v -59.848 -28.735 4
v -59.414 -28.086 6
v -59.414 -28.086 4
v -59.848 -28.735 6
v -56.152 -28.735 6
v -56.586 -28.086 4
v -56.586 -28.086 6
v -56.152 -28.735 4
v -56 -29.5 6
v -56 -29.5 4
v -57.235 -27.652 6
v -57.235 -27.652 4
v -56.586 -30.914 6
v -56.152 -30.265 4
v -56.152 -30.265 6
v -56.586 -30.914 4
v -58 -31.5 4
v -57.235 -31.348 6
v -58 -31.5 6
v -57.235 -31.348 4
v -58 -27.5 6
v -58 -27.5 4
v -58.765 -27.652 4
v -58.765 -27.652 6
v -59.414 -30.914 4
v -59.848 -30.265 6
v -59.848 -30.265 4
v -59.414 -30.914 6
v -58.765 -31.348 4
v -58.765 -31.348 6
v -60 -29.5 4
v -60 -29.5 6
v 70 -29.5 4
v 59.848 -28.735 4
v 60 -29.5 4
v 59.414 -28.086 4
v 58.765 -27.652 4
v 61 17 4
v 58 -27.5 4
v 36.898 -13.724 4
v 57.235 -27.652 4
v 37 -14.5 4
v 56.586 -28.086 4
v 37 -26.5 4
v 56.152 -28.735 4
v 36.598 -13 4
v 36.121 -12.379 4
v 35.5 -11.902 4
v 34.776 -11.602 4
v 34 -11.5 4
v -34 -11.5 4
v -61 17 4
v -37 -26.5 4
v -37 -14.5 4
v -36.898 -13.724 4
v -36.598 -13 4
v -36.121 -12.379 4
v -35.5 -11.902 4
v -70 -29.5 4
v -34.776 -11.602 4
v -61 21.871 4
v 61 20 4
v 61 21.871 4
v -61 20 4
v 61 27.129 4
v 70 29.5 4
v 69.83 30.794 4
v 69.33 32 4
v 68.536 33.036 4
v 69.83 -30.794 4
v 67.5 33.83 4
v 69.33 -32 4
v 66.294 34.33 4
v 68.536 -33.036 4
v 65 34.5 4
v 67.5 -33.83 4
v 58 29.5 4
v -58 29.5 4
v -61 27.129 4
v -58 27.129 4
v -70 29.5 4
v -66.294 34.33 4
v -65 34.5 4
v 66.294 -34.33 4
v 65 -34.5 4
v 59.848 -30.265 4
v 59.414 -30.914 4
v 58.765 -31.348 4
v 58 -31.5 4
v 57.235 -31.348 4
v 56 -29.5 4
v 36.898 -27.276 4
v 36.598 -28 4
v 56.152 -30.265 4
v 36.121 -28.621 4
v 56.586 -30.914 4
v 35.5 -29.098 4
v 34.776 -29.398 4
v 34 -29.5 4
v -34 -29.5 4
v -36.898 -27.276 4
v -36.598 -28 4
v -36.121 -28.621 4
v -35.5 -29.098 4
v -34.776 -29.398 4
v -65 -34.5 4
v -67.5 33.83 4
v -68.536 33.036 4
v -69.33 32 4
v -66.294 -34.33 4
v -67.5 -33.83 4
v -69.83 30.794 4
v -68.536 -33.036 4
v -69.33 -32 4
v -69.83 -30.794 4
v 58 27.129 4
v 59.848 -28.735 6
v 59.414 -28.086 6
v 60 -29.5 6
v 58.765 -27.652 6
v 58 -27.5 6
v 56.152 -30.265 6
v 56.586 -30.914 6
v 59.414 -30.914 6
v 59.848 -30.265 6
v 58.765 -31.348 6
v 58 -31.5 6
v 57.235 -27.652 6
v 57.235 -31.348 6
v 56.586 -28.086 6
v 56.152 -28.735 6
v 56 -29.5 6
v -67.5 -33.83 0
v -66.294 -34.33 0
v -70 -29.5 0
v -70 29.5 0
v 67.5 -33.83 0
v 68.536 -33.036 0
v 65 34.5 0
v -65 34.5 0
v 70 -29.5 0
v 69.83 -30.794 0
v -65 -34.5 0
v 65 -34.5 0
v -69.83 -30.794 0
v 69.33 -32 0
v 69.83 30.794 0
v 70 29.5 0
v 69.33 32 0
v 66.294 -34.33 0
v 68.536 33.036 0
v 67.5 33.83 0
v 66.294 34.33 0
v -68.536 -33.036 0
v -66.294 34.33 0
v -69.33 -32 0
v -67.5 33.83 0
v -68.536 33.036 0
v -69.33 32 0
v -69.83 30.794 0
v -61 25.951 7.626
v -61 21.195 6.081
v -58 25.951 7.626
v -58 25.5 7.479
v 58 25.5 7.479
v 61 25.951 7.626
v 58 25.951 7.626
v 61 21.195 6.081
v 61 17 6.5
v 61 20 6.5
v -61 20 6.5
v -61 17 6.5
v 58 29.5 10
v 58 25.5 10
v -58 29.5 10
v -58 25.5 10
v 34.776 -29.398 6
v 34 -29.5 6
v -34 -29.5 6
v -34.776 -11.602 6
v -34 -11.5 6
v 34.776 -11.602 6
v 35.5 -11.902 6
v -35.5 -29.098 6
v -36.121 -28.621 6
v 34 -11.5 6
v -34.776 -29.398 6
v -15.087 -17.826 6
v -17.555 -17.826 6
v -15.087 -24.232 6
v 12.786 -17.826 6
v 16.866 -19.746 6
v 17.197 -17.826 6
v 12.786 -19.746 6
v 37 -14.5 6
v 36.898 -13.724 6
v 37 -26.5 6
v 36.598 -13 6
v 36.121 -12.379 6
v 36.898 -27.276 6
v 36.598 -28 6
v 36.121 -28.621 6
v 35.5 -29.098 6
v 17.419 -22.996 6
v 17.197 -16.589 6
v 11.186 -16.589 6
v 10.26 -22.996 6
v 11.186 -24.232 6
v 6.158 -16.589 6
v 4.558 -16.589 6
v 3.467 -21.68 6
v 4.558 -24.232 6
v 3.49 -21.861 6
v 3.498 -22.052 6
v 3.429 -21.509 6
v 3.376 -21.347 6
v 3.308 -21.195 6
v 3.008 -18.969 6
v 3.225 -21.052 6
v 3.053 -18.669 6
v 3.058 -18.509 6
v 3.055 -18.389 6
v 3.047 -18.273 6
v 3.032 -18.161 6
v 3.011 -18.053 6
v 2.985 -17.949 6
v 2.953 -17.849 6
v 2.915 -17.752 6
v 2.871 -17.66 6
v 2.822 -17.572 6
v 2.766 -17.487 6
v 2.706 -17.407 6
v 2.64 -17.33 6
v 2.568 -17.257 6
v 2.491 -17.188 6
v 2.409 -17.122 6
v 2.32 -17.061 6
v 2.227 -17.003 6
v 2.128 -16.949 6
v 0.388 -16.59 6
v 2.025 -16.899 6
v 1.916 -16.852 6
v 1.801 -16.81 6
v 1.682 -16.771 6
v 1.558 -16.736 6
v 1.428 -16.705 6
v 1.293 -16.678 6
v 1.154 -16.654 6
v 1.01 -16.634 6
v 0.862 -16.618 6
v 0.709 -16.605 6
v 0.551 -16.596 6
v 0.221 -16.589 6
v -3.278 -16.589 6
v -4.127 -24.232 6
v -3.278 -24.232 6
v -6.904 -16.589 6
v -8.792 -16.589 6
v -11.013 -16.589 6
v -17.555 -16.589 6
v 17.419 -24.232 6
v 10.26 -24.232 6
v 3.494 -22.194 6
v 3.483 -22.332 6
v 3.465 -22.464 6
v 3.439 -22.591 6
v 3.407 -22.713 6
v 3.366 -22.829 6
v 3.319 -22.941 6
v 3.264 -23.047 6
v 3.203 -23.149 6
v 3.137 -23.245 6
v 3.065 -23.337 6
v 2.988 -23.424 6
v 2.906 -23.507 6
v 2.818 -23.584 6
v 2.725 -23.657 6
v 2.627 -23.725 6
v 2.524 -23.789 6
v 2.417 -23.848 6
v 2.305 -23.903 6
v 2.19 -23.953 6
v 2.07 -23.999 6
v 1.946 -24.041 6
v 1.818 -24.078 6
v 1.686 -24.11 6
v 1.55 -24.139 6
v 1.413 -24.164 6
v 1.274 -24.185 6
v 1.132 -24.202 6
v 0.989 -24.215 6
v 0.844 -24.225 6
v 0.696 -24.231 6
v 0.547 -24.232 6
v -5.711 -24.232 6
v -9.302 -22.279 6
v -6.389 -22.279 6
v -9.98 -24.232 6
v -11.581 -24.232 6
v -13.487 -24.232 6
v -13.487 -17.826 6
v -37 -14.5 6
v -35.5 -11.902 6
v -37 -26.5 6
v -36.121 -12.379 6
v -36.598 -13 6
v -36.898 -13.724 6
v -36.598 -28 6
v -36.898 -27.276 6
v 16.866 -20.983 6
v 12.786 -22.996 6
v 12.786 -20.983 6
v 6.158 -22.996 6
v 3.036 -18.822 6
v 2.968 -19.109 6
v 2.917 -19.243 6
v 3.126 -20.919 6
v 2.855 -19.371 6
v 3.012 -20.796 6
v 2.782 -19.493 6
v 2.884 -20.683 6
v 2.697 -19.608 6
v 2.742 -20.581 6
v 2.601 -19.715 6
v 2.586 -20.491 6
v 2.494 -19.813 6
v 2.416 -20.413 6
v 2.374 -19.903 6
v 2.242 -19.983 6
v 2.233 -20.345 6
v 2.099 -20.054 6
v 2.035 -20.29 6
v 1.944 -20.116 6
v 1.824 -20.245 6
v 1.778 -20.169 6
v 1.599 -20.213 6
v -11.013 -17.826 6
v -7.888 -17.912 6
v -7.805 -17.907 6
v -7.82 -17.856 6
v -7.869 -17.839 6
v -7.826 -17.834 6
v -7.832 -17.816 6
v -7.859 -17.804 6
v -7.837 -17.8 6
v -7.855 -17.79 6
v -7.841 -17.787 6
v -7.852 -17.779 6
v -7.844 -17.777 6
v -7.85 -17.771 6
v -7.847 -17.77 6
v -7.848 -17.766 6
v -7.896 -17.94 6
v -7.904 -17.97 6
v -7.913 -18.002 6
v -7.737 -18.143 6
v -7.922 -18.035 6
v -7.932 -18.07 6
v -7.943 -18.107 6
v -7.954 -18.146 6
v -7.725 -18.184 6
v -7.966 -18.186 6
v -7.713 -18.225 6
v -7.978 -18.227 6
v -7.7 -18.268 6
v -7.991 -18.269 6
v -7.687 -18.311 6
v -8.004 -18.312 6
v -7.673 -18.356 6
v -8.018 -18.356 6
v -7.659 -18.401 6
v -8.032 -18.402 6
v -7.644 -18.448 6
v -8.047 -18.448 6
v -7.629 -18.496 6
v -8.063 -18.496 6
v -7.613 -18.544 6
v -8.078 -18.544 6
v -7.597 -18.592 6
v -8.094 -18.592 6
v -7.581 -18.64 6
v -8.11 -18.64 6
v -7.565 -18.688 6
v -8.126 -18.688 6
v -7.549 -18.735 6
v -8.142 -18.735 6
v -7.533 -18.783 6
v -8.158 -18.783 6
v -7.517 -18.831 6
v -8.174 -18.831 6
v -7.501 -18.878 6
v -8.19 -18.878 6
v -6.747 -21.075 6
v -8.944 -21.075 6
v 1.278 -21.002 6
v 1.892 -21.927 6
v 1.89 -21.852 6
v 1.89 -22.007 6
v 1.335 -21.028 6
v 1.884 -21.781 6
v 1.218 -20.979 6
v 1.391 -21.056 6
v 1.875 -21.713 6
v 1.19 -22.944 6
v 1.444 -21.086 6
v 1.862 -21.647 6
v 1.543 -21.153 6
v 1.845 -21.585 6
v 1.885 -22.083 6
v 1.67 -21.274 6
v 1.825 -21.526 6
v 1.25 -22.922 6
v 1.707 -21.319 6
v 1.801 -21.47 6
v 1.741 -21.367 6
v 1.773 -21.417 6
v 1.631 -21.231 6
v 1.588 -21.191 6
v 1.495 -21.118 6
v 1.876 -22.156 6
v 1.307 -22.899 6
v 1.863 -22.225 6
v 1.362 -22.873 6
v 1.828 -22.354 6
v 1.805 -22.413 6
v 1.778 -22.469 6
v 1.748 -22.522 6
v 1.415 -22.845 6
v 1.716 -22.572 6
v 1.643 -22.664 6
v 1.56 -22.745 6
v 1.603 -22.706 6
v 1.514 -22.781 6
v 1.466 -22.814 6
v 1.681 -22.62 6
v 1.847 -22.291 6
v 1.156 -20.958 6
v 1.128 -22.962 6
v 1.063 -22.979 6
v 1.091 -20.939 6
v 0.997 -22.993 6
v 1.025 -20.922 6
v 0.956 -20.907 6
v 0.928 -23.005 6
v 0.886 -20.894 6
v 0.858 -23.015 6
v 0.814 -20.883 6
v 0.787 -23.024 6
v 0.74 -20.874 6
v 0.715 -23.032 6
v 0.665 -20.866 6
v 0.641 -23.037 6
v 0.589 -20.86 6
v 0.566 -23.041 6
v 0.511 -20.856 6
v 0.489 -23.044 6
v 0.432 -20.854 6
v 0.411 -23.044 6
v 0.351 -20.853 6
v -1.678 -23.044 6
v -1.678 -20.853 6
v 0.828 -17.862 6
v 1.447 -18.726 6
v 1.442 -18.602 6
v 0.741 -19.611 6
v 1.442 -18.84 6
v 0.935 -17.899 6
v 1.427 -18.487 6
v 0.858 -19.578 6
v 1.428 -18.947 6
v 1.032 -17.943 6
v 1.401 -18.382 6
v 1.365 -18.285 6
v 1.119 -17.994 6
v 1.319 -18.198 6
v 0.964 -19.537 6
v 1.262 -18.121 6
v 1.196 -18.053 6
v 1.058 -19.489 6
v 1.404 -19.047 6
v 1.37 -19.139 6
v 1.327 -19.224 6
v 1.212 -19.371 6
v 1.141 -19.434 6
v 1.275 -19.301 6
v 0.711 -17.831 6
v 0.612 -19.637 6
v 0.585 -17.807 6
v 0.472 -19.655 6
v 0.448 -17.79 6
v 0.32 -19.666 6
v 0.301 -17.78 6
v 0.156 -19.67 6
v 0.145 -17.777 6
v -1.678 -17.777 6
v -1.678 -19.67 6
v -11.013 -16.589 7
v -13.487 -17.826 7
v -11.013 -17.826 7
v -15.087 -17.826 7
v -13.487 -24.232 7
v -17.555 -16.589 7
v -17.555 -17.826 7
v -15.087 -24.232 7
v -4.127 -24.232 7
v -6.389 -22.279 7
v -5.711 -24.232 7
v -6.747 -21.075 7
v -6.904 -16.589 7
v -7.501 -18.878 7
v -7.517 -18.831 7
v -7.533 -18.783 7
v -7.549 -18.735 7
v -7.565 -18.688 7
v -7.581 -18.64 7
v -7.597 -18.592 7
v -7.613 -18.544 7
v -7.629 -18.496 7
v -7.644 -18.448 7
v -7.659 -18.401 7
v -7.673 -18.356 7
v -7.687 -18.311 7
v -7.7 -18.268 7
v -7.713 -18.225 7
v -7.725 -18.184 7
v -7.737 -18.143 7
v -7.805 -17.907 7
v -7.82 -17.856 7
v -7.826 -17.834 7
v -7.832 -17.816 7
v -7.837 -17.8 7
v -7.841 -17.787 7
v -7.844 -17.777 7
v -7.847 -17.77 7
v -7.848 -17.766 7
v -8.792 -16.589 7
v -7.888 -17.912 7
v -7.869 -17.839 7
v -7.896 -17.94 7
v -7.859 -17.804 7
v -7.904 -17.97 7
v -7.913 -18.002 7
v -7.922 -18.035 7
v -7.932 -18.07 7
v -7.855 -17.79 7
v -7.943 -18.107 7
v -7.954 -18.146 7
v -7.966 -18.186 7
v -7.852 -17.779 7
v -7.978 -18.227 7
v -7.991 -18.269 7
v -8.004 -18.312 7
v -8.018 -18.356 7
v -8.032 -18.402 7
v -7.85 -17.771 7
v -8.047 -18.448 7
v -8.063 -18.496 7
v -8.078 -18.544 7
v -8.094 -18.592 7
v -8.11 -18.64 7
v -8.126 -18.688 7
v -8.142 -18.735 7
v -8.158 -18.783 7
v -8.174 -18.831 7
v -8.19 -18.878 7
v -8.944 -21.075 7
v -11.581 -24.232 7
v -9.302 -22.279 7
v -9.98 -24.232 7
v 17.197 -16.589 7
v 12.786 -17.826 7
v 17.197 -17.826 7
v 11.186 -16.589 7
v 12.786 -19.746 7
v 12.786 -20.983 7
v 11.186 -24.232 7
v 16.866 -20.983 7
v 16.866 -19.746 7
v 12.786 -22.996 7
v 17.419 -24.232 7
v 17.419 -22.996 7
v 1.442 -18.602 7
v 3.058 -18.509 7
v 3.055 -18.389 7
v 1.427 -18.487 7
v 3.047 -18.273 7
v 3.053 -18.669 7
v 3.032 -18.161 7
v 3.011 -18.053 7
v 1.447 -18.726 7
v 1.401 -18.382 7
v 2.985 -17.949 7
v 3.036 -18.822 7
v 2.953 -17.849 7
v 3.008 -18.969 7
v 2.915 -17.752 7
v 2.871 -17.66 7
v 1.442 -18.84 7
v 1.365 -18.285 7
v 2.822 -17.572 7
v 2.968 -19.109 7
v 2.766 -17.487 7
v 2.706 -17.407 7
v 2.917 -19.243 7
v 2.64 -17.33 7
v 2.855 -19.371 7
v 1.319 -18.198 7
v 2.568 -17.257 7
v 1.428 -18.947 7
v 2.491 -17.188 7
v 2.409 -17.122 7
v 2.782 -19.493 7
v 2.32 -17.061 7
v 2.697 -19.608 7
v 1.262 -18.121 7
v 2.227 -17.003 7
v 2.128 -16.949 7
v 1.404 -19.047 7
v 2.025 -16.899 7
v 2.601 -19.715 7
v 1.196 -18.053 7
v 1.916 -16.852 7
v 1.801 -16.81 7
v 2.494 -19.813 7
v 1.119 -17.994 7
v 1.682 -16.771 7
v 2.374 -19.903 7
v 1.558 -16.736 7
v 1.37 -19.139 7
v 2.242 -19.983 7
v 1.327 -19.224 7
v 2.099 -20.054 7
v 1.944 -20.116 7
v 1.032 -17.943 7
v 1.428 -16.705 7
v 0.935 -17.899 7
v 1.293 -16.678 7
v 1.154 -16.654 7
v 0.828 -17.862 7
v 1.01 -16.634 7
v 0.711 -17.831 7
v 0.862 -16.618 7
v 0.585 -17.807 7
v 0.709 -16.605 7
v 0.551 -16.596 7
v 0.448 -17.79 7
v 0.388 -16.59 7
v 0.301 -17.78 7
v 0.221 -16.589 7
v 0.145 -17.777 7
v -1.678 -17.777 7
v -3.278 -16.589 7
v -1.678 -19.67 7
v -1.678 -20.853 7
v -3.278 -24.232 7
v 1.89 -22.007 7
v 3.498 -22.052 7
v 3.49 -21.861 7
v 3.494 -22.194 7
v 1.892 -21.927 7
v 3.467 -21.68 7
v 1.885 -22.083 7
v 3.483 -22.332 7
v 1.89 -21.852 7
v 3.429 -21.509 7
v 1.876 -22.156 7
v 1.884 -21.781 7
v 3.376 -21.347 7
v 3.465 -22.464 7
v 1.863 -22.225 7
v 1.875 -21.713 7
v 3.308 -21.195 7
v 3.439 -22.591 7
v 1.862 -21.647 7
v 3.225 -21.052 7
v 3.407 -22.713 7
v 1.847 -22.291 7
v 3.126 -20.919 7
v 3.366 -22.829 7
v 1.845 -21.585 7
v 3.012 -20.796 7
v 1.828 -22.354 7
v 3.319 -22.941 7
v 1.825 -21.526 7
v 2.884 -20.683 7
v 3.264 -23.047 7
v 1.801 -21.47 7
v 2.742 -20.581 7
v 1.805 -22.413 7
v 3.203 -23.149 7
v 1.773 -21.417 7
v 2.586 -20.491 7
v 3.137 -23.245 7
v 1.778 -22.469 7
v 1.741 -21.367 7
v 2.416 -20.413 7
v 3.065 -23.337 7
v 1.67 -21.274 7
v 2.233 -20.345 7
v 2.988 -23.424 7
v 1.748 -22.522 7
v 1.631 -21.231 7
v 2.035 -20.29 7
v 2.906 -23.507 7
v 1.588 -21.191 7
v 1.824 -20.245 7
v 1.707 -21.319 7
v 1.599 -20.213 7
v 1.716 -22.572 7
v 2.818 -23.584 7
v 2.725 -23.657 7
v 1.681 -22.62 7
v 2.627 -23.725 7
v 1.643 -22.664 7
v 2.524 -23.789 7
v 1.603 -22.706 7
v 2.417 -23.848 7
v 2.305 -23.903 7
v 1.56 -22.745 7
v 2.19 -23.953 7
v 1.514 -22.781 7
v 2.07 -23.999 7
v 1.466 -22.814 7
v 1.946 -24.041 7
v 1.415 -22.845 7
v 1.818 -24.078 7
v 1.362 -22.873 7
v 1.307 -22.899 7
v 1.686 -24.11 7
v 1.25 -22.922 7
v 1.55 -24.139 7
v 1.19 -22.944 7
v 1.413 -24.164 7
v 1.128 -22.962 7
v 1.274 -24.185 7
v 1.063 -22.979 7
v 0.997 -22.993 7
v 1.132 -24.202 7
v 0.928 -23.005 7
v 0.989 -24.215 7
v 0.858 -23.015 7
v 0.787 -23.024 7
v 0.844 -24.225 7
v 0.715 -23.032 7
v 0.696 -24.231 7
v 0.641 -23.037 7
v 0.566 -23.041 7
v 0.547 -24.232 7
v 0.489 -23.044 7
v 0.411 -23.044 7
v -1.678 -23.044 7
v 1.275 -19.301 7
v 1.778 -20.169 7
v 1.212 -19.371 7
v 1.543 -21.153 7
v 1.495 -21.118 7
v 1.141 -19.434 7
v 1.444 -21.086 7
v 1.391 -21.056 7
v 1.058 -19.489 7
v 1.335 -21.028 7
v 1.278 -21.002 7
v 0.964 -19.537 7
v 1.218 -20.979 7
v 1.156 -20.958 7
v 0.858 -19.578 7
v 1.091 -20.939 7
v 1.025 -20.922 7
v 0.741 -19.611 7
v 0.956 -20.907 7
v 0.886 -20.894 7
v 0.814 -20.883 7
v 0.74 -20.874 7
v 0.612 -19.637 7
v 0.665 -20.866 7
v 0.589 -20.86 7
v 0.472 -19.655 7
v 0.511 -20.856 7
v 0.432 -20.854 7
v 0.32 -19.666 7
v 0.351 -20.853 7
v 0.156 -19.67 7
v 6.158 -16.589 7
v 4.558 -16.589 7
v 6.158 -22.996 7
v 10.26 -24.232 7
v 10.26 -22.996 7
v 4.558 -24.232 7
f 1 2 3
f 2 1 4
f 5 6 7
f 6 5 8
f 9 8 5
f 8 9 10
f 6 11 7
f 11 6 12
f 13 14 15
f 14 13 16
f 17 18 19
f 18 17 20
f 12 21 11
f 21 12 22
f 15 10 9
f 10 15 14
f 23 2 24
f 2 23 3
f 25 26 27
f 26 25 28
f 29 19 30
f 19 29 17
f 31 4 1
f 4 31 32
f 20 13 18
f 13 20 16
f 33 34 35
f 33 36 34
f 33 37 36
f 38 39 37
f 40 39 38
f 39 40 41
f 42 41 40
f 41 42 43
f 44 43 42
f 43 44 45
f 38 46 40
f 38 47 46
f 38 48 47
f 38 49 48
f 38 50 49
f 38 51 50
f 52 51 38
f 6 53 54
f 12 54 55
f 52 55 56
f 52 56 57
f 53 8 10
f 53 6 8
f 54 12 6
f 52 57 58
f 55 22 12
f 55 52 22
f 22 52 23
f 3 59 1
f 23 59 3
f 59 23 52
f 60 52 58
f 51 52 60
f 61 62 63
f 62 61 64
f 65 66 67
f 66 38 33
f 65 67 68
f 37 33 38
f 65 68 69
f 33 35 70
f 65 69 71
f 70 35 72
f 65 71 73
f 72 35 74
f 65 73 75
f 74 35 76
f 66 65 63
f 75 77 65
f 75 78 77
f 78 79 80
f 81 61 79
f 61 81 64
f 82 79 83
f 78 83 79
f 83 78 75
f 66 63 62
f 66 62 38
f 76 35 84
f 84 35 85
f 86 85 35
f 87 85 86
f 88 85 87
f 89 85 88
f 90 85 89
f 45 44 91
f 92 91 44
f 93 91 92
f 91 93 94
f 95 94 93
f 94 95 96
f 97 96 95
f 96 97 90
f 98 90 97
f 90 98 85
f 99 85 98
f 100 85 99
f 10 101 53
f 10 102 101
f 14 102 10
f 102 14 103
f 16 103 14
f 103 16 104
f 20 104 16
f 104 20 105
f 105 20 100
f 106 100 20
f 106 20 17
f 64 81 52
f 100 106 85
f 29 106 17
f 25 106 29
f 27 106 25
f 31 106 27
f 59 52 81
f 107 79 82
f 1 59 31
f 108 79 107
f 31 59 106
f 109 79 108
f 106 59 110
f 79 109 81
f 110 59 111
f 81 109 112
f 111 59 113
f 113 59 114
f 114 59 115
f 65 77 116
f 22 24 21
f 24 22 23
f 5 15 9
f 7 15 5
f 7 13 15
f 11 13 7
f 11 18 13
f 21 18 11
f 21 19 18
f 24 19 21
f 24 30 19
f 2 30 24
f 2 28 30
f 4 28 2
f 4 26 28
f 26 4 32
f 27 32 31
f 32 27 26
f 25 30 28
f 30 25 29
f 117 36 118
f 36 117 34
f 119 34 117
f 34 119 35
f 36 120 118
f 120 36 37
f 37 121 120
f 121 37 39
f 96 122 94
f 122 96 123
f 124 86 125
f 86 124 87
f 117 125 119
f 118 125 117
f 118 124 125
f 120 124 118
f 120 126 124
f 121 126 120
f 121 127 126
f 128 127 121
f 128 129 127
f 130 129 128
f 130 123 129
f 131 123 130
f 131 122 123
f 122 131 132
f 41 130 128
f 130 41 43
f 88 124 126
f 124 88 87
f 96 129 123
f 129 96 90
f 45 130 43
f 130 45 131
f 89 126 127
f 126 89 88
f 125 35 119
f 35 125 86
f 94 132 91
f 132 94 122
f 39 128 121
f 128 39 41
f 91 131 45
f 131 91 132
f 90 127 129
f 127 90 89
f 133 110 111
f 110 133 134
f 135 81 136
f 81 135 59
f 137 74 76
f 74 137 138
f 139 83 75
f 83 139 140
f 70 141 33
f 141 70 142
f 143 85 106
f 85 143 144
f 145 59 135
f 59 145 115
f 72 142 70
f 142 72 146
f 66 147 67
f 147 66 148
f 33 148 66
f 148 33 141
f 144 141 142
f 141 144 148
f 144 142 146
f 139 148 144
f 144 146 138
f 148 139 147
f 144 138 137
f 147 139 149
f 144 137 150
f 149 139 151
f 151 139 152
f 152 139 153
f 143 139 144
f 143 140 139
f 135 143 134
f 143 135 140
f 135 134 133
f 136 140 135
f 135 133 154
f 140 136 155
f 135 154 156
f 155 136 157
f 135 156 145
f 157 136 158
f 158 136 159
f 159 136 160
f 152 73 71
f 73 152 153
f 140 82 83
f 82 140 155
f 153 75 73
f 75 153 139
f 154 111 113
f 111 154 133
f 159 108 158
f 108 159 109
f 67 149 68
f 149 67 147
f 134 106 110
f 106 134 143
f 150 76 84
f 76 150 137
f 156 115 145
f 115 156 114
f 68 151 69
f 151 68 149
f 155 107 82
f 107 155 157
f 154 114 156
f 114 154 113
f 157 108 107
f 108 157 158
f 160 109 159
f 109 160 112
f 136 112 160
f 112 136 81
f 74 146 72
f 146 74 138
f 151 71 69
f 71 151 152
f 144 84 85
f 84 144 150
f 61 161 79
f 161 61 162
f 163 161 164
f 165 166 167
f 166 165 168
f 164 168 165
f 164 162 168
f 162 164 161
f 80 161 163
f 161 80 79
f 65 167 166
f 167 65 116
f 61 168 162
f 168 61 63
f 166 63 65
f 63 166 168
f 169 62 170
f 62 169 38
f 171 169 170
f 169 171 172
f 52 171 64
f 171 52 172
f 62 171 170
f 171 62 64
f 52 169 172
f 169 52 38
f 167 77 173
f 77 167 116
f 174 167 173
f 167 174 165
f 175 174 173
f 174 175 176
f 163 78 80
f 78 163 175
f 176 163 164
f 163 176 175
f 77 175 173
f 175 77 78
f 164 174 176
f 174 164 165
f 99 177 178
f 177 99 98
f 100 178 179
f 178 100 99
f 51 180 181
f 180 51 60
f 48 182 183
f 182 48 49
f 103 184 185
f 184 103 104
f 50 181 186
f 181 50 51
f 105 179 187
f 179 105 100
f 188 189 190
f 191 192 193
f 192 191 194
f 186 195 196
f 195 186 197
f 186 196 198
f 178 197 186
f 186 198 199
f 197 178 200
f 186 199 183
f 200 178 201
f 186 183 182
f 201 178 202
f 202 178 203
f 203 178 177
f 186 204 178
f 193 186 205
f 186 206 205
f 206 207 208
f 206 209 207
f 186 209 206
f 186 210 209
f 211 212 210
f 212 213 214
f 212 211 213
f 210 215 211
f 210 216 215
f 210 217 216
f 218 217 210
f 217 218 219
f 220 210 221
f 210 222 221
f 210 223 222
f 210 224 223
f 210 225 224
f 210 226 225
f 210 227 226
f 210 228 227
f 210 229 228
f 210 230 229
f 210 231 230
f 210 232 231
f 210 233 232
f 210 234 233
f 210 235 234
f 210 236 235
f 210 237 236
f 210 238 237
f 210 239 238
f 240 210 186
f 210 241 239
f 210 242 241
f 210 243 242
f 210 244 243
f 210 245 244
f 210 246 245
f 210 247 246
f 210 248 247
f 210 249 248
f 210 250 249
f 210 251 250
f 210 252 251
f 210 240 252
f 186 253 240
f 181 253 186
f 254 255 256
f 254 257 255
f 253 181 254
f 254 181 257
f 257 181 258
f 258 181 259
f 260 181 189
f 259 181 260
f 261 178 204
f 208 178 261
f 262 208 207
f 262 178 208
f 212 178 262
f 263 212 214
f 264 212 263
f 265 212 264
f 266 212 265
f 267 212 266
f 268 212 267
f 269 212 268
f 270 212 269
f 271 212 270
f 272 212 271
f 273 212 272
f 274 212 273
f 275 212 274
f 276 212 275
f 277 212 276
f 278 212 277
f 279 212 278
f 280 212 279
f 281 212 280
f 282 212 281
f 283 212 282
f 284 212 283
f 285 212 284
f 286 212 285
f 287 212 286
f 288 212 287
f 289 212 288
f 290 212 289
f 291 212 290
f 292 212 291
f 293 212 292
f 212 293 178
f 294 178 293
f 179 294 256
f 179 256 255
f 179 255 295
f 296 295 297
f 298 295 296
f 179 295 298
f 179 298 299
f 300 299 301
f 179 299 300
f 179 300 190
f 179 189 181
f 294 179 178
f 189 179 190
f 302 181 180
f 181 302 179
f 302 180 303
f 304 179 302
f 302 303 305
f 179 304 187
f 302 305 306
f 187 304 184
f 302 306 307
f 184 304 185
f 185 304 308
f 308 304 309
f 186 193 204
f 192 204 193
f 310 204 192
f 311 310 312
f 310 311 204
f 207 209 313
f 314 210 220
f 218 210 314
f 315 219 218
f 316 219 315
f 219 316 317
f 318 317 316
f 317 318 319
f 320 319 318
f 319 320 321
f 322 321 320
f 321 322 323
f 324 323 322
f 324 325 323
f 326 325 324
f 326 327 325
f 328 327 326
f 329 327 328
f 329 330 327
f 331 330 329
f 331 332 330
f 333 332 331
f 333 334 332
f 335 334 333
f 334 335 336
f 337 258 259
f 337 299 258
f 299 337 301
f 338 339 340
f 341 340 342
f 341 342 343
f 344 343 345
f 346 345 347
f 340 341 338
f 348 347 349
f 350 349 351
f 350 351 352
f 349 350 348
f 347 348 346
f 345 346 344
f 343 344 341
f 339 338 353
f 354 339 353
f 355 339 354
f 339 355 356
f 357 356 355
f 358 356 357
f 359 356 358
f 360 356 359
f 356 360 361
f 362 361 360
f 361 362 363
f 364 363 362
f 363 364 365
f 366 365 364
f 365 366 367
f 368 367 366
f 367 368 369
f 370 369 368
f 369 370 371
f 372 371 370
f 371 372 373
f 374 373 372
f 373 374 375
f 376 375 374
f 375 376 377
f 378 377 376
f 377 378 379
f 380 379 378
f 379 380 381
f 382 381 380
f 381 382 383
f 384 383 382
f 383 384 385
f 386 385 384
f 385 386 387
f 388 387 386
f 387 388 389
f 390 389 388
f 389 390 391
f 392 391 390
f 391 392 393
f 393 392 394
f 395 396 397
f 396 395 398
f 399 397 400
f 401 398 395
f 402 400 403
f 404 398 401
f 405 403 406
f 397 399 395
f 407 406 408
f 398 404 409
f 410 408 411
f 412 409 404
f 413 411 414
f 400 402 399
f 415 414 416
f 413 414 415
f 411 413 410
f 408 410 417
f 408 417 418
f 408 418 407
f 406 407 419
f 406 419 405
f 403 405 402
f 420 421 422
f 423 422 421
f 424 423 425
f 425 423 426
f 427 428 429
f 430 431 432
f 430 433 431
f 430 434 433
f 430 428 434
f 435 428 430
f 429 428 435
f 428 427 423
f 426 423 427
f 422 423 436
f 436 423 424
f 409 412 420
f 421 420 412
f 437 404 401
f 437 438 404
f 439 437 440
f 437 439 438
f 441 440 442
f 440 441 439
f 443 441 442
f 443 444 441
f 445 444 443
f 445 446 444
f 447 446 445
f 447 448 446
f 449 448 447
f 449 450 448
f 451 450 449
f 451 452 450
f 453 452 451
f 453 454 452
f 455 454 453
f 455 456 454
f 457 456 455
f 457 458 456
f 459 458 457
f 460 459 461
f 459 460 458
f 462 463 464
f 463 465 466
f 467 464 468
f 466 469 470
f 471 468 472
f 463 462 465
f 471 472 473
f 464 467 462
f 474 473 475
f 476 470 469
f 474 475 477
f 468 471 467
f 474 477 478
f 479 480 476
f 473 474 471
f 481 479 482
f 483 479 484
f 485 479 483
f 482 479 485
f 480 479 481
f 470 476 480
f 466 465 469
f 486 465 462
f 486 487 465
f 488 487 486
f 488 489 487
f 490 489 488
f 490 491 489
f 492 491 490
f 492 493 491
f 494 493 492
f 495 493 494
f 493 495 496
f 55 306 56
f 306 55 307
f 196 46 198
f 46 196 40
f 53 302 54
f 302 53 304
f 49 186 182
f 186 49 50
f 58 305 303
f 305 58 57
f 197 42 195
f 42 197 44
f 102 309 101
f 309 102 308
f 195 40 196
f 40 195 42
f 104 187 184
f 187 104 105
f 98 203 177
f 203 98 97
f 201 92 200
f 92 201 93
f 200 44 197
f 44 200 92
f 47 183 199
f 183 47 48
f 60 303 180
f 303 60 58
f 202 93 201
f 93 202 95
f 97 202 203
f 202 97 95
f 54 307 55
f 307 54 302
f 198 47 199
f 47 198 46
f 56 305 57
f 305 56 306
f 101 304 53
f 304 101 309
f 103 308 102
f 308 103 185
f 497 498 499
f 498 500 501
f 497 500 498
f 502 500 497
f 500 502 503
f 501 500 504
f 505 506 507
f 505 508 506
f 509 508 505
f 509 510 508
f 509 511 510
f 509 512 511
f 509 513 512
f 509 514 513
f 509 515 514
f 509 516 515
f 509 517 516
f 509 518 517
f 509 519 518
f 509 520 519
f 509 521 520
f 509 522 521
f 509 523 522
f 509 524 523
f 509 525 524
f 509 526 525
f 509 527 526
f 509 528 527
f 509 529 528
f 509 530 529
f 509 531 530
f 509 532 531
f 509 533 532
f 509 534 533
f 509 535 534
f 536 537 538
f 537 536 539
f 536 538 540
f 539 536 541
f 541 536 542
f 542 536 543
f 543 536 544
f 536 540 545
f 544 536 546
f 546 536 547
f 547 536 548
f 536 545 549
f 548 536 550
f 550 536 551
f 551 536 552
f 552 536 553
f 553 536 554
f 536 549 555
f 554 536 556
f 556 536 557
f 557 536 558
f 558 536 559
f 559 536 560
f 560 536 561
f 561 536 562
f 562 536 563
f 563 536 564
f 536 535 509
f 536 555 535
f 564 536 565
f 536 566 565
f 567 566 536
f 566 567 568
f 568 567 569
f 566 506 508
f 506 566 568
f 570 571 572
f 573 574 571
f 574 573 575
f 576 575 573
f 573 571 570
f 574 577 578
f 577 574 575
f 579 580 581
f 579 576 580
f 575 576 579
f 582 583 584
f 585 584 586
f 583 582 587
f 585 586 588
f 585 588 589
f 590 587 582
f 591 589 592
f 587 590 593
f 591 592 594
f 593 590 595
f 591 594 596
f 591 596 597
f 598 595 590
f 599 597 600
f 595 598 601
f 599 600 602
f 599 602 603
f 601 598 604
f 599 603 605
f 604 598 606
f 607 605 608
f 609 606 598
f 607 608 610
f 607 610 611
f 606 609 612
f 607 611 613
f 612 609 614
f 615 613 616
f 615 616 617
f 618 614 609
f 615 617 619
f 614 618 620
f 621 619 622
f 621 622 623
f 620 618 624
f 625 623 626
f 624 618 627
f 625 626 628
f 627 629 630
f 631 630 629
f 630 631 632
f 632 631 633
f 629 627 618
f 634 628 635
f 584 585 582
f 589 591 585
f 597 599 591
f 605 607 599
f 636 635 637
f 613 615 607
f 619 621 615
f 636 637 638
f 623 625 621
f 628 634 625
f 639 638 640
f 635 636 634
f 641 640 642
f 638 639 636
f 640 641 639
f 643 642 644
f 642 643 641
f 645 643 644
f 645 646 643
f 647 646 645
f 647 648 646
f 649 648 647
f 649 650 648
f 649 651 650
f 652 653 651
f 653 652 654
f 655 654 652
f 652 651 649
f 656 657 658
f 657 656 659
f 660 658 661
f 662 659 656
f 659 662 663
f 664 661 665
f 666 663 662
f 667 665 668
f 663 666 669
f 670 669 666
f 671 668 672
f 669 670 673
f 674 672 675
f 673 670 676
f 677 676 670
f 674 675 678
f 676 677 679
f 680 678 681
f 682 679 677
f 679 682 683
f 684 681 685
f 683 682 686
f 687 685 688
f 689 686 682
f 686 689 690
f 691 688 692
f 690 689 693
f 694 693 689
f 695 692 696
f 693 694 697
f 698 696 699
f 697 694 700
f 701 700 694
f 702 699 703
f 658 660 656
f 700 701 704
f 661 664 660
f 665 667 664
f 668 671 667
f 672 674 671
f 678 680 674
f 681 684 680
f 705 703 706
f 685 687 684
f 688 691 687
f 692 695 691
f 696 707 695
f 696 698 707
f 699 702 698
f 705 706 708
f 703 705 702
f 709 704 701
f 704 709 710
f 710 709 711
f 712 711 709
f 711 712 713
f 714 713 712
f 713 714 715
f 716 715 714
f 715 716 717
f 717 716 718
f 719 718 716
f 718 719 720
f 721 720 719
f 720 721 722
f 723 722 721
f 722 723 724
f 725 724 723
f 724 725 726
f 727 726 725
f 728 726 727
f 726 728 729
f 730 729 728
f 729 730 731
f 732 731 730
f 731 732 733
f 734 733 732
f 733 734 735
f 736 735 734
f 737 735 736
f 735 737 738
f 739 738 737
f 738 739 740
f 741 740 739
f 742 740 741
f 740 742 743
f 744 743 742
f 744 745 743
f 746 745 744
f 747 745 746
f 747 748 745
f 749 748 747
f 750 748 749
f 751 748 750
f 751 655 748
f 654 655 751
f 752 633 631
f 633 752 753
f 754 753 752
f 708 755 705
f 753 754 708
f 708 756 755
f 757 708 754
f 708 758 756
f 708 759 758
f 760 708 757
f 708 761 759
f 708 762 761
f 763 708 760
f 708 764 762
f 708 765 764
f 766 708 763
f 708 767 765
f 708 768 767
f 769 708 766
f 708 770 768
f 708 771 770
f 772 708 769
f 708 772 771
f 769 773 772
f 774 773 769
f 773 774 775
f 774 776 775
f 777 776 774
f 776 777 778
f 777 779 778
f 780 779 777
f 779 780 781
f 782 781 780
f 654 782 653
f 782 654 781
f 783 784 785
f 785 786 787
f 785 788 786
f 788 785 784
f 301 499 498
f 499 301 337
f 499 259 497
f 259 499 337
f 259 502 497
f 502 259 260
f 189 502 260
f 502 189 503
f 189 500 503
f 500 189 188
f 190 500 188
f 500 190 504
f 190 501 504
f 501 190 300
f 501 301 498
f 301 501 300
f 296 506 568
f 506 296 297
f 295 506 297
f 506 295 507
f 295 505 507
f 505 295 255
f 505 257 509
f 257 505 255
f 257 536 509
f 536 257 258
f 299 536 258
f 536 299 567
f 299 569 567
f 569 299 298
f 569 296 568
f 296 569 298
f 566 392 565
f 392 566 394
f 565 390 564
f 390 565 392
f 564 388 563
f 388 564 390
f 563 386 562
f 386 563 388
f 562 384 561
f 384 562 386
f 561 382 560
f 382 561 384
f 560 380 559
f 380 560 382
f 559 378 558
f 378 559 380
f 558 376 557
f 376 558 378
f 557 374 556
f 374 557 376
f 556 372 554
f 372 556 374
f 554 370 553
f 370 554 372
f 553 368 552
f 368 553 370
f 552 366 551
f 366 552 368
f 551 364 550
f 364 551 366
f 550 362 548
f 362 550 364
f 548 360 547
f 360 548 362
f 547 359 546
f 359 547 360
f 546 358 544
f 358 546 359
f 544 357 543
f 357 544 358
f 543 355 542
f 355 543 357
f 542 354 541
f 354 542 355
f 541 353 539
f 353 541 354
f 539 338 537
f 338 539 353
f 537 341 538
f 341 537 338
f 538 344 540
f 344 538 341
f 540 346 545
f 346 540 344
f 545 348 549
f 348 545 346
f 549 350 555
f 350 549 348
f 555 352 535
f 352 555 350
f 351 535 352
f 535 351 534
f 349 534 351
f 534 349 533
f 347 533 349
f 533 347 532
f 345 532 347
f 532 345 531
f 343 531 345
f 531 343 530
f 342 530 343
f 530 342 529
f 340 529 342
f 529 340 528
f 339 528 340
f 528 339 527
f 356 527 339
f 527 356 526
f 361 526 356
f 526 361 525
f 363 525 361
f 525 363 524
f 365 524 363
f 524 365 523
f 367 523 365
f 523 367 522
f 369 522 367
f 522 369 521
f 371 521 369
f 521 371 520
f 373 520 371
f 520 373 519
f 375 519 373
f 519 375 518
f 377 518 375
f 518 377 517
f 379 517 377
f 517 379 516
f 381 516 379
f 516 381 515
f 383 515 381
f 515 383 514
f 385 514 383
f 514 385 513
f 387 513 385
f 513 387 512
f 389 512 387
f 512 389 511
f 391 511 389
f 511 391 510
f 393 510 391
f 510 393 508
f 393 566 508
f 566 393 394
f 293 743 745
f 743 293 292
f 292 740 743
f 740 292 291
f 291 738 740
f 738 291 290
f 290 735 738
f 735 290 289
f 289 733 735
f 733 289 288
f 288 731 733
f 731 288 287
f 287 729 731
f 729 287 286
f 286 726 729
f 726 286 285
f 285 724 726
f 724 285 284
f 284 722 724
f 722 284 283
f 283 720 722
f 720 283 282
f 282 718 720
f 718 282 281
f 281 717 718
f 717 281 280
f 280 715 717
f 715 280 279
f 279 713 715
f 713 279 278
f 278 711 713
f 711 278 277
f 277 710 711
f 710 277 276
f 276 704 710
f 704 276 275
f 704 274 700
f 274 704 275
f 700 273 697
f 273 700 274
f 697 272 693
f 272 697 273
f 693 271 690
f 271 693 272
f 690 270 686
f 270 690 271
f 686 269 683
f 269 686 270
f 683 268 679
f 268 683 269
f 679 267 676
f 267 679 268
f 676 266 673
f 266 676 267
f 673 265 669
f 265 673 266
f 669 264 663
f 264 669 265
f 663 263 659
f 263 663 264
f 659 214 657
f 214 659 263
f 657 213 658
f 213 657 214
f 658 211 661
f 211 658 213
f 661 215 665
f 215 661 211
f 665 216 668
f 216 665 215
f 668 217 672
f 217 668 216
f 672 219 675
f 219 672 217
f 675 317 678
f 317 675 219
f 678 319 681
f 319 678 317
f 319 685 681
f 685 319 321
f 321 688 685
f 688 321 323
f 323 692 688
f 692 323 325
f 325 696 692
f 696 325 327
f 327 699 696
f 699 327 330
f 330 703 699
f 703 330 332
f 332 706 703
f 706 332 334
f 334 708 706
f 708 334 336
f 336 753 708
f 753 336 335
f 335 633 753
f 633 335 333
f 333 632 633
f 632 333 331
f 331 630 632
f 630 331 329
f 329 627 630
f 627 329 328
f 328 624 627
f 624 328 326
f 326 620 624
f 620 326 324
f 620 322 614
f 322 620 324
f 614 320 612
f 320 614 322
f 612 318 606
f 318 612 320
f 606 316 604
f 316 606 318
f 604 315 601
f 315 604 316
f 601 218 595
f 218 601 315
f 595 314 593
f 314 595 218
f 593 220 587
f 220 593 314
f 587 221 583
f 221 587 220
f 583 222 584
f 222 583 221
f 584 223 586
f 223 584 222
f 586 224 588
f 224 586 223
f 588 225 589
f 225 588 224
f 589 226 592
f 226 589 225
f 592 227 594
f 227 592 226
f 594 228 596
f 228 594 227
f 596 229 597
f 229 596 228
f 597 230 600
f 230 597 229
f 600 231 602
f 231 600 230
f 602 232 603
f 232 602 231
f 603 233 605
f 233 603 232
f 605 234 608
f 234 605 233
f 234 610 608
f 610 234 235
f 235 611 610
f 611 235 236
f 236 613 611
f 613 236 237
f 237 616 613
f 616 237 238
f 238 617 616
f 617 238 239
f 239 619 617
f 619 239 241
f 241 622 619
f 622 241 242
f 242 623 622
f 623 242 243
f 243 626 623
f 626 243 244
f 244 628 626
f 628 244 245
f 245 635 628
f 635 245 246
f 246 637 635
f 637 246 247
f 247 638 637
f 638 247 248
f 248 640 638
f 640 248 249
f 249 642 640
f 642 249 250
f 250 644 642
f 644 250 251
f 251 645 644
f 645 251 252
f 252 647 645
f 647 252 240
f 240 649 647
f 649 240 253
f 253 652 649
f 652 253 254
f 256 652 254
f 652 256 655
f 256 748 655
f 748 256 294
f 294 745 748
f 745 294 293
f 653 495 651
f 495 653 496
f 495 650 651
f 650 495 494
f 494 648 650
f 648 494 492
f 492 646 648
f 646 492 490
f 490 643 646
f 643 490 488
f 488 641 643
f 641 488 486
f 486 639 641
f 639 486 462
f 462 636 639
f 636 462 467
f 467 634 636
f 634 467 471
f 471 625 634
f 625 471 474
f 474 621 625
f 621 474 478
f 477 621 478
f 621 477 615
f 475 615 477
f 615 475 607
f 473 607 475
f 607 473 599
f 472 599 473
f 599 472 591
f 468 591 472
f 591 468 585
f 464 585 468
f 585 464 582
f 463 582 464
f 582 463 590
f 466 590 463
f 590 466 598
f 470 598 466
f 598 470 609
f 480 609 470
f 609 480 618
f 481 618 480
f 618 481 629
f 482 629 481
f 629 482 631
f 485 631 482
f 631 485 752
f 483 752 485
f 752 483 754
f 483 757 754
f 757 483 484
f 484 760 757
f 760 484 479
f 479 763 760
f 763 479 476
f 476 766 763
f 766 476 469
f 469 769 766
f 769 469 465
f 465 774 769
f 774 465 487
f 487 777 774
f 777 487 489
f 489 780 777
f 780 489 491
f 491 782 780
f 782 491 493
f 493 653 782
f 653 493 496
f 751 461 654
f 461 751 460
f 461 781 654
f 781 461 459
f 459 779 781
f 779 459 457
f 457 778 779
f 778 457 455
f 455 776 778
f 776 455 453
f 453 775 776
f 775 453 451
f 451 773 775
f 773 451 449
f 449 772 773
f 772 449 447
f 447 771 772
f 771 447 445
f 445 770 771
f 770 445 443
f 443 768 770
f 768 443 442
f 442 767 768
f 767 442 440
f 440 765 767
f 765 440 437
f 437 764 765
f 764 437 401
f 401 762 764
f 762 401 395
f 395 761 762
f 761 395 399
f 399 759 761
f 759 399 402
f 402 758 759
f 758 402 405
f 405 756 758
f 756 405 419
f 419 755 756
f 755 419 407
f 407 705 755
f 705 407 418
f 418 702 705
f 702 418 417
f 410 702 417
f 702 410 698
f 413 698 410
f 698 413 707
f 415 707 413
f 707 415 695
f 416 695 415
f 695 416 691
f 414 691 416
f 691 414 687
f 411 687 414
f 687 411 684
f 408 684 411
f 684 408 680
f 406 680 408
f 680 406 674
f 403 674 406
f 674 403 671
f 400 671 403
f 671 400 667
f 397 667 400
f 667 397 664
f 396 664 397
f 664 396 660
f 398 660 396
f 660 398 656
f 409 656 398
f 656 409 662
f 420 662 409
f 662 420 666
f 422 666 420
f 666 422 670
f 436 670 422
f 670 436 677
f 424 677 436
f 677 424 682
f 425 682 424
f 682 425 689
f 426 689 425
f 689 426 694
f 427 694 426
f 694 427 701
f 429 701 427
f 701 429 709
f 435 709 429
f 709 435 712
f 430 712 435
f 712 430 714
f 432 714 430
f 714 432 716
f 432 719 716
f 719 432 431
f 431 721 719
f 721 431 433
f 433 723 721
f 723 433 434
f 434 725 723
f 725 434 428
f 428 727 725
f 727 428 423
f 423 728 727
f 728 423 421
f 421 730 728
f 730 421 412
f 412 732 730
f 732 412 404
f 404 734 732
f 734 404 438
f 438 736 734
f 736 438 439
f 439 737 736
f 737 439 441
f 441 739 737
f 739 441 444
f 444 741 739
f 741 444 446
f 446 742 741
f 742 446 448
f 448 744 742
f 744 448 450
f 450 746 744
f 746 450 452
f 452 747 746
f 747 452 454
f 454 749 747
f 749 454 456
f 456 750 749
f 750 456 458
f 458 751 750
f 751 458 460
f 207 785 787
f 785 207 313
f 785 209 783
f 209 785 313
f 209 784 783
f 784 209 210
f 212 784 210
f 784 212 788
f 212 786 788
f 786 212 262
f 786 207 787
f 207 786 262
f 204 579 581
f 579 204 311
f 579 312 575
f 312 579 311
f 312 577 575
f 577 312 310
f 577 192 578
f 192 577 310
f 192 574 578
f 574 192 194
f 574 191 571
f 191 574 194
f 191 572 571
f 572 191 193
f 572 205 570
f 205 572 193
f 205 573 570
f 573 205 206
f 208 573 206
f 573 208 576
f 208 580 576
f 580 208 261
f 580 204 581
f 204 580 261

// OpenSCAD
// SPDX-License-Identifier: MIT
// wedding-place-card | Overseas detail refinement batch 03 | original parametric prototype.
// Millimeters, Z-up. Published envelope W x D x H = 140 x 69 x 10.
// Keep this SKU's catalogue identity and family/variant unchanged.
use <lib/commerce_forms.scad>
use <lib/refined_batch03_forms.scad>
w = 140; d = 69; h = 10;
label = "TABLE";
refined_batch03_form(slug="wedding-place-card",family="gift",variant=2,w=w,d=d,h=h,label=label);
